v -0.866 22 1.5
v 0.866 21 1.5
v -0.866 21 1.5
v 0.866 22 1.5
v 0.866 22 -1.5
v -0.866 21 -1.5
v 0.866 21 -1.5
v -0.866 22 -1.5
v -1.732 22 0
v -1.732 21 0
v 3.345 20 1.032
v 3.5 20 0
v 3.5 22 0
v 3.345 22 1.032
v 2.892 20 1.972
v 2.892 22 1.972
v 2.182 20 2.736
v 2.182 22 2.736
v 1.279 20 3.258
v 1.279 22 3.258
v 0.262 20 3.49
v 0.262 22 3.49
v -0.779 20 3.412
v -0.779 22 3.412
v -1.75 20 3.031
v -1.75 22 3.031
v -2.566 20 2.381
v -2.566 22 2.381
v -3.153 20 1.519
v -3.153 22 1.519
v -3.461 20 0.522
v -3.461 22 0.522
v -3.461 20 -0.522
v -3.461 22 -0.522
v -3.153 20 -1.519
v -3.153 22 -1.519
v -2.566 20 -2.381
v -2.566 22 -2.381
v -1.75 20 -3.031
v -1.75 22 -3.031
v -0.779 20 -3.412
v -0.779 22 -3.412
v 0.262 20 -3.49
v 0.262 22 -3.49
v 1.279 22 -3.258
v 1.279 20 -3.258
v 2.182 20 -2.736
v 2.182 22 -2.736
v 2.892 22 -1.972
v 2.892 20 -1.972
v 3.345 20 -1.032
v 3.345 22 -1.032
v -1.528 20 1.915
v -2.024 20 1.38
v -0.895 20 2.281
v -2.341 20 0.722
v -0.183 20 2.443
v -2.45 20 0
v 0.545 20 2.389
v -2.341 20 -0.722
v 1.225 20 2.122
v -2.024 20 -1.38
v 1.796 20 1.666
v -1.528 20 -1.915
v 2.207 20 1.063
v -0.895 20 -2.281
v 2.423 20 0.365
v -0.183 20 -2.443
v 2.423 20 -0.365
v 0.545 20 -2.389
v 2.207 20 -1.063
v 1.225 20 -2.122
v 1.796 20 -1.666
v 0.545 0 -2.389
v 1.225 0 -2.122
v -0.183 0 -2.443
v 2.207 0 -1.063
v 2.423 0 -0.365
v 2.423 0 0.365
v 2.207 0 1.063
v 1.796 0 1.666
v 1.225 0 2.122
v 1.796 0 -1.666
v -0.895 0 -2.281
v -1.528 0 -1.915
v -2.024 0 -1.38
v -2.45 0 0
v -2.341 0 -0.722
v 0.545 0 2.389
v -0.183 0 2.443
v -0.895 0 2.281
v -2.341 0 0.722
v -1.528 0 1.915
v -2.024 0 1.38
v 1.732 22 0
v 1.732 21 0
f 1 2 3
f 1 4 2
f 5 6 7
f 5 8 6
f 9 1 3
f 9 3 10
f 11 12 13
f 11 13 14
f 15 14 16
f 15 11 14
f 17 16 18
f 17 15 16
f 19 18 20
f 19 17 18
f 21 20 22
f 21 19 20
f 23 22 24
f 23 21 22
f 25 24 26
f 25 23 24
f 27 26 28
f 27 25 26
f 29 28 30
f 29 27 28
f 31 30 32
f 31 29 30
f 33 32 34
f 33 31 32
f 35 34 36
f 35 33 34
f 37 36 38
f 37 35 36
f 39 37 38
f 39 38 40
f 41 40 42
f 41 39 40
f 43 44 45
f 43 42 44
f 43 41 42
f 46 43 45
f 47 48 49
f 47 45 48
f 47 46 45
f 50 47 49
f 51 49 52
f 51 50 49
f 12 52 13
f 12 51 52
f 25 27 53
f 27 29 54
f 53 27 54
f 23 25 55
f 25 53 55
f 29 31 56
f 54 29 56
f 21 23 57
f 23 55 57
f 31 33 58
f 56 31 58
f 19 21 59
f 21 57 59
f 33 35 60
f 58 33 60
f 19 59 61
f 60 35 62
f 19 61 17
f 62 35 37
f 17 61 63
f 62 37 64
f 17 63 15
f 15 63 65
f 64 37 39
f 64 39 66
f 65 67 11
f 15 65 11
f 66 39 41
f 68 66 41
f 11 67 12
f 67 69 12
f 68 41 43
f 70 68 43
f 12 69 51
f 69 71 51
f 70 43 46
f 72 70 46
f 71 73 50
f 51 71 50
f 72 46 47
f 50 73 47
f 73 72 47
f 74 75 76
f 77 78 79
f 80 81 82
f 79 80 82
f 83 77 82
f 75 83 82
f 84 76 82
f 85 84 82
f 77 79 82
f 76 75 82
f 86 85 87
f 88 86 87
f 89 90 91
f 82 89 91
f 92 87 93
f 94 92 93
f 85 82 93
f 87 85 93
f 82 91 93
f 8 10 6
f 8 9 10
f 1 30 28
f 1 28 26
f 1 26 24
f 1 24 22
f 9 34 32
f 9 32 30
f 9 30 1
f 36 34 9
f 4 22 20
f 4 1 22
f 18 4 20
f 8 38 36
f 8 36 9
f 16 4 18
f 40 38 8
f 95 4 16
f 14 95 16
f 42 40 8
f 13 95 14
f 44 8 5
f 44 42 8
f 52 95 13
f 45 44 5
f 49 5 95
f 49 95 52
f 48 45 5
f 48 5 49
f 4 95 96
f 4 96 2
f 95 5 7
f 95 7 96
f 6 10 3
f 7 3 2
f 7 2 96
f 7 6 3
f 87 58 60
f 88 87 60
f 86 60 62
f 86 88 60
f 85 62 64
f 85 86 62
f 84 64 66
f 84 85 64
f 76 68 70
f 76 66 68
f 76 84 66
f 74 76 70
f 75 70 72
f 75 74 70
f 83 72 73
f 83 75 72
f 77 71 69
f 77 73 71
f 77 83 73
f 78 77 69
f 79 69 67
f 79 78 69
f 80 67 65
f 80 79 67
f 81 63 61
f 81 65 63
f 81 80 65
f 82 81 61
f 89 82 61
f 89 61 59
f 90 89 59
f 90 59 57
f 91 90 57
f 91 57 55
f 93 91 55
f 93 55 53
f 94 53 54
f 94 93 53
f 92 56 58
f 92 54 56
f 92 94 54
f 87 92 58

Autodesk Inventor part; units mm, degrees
ref_plane "YZ Plane" through (0, 0, 0) normal (1, 0, 0) x (0, 1, 0)
ref_plane "XZ Plane" through (0, 0, 0) normal (0, 1, 0) x (-1, 0, 0)
ref_plane "XY Plane" through (0, 0, 0) normal (0, 0, 1) x (1, 0, 0)
sketch "Sketch1" plane through (0, 0, 0) normal (0, 1, 0) x (-1, 0, 0)
  circle A0 centre (0, 0) radius 2.45
  dimension "d0" = 4.9
extrude "Extrusion1" add sketch "Sketch1" along normal blind 20
sketch "Sketch2" plane through (0, 20, 0) normal (0, 1, 0) x (1, 0, 0)
  circle A0 centre (0, 0) radius 3.5
  dimension "d3" = 7
extrude "Extrusion2" add sketch "Sketch2" along normal blind 2
thread "Thread1" size "M5x0.8" class "6g" standard "ANSI Metric M Profile" full length
sketch "Sketch3" plane through (0, 22, 0) normal (0, 1, 0) x (1, 0, 0)
  line L0 (0.866, 1.5) -> (1.7321, 0)
  line L1 (1.7321, 0) -> (0.866, -1.5)
  line L2 (0.866, -1.5) -> (-0.866, -1.5)
  line L3 (-0.866, -1.5) -> (-1.7321, 0)
  line L4 (-1.7321, 0) -> (-0.866, 1.5)
  line L5 (-0.866, 1.5) -> (0.866, 1.5)
  point P0 (0, 0)
  point P1 (0, 0)
  dimension "d8" = 3
extrude "Extrusion3" cut sketch "Sketch3" against normal blind 1
equation "\"BendRadius\" = Thickness"
equation "\"BendReliefWidth\" = Thickness"
equation "\"BendReliefDepth\" = 0.5 * Thickness"
equation "\"CornerReliefSize\" = 4 * Thickness"
equation "\"MinimumRemnant\" = 2 * Thickness"
equation "\"TransitionRadius\" = BendRadius"
equation "\"JacobiRadiusSize\" = BendRadius"
equation "\"GapSize\" = Thickness"
equation "\"Thickness\" = 0.5"
properties part number "perno_simple"
